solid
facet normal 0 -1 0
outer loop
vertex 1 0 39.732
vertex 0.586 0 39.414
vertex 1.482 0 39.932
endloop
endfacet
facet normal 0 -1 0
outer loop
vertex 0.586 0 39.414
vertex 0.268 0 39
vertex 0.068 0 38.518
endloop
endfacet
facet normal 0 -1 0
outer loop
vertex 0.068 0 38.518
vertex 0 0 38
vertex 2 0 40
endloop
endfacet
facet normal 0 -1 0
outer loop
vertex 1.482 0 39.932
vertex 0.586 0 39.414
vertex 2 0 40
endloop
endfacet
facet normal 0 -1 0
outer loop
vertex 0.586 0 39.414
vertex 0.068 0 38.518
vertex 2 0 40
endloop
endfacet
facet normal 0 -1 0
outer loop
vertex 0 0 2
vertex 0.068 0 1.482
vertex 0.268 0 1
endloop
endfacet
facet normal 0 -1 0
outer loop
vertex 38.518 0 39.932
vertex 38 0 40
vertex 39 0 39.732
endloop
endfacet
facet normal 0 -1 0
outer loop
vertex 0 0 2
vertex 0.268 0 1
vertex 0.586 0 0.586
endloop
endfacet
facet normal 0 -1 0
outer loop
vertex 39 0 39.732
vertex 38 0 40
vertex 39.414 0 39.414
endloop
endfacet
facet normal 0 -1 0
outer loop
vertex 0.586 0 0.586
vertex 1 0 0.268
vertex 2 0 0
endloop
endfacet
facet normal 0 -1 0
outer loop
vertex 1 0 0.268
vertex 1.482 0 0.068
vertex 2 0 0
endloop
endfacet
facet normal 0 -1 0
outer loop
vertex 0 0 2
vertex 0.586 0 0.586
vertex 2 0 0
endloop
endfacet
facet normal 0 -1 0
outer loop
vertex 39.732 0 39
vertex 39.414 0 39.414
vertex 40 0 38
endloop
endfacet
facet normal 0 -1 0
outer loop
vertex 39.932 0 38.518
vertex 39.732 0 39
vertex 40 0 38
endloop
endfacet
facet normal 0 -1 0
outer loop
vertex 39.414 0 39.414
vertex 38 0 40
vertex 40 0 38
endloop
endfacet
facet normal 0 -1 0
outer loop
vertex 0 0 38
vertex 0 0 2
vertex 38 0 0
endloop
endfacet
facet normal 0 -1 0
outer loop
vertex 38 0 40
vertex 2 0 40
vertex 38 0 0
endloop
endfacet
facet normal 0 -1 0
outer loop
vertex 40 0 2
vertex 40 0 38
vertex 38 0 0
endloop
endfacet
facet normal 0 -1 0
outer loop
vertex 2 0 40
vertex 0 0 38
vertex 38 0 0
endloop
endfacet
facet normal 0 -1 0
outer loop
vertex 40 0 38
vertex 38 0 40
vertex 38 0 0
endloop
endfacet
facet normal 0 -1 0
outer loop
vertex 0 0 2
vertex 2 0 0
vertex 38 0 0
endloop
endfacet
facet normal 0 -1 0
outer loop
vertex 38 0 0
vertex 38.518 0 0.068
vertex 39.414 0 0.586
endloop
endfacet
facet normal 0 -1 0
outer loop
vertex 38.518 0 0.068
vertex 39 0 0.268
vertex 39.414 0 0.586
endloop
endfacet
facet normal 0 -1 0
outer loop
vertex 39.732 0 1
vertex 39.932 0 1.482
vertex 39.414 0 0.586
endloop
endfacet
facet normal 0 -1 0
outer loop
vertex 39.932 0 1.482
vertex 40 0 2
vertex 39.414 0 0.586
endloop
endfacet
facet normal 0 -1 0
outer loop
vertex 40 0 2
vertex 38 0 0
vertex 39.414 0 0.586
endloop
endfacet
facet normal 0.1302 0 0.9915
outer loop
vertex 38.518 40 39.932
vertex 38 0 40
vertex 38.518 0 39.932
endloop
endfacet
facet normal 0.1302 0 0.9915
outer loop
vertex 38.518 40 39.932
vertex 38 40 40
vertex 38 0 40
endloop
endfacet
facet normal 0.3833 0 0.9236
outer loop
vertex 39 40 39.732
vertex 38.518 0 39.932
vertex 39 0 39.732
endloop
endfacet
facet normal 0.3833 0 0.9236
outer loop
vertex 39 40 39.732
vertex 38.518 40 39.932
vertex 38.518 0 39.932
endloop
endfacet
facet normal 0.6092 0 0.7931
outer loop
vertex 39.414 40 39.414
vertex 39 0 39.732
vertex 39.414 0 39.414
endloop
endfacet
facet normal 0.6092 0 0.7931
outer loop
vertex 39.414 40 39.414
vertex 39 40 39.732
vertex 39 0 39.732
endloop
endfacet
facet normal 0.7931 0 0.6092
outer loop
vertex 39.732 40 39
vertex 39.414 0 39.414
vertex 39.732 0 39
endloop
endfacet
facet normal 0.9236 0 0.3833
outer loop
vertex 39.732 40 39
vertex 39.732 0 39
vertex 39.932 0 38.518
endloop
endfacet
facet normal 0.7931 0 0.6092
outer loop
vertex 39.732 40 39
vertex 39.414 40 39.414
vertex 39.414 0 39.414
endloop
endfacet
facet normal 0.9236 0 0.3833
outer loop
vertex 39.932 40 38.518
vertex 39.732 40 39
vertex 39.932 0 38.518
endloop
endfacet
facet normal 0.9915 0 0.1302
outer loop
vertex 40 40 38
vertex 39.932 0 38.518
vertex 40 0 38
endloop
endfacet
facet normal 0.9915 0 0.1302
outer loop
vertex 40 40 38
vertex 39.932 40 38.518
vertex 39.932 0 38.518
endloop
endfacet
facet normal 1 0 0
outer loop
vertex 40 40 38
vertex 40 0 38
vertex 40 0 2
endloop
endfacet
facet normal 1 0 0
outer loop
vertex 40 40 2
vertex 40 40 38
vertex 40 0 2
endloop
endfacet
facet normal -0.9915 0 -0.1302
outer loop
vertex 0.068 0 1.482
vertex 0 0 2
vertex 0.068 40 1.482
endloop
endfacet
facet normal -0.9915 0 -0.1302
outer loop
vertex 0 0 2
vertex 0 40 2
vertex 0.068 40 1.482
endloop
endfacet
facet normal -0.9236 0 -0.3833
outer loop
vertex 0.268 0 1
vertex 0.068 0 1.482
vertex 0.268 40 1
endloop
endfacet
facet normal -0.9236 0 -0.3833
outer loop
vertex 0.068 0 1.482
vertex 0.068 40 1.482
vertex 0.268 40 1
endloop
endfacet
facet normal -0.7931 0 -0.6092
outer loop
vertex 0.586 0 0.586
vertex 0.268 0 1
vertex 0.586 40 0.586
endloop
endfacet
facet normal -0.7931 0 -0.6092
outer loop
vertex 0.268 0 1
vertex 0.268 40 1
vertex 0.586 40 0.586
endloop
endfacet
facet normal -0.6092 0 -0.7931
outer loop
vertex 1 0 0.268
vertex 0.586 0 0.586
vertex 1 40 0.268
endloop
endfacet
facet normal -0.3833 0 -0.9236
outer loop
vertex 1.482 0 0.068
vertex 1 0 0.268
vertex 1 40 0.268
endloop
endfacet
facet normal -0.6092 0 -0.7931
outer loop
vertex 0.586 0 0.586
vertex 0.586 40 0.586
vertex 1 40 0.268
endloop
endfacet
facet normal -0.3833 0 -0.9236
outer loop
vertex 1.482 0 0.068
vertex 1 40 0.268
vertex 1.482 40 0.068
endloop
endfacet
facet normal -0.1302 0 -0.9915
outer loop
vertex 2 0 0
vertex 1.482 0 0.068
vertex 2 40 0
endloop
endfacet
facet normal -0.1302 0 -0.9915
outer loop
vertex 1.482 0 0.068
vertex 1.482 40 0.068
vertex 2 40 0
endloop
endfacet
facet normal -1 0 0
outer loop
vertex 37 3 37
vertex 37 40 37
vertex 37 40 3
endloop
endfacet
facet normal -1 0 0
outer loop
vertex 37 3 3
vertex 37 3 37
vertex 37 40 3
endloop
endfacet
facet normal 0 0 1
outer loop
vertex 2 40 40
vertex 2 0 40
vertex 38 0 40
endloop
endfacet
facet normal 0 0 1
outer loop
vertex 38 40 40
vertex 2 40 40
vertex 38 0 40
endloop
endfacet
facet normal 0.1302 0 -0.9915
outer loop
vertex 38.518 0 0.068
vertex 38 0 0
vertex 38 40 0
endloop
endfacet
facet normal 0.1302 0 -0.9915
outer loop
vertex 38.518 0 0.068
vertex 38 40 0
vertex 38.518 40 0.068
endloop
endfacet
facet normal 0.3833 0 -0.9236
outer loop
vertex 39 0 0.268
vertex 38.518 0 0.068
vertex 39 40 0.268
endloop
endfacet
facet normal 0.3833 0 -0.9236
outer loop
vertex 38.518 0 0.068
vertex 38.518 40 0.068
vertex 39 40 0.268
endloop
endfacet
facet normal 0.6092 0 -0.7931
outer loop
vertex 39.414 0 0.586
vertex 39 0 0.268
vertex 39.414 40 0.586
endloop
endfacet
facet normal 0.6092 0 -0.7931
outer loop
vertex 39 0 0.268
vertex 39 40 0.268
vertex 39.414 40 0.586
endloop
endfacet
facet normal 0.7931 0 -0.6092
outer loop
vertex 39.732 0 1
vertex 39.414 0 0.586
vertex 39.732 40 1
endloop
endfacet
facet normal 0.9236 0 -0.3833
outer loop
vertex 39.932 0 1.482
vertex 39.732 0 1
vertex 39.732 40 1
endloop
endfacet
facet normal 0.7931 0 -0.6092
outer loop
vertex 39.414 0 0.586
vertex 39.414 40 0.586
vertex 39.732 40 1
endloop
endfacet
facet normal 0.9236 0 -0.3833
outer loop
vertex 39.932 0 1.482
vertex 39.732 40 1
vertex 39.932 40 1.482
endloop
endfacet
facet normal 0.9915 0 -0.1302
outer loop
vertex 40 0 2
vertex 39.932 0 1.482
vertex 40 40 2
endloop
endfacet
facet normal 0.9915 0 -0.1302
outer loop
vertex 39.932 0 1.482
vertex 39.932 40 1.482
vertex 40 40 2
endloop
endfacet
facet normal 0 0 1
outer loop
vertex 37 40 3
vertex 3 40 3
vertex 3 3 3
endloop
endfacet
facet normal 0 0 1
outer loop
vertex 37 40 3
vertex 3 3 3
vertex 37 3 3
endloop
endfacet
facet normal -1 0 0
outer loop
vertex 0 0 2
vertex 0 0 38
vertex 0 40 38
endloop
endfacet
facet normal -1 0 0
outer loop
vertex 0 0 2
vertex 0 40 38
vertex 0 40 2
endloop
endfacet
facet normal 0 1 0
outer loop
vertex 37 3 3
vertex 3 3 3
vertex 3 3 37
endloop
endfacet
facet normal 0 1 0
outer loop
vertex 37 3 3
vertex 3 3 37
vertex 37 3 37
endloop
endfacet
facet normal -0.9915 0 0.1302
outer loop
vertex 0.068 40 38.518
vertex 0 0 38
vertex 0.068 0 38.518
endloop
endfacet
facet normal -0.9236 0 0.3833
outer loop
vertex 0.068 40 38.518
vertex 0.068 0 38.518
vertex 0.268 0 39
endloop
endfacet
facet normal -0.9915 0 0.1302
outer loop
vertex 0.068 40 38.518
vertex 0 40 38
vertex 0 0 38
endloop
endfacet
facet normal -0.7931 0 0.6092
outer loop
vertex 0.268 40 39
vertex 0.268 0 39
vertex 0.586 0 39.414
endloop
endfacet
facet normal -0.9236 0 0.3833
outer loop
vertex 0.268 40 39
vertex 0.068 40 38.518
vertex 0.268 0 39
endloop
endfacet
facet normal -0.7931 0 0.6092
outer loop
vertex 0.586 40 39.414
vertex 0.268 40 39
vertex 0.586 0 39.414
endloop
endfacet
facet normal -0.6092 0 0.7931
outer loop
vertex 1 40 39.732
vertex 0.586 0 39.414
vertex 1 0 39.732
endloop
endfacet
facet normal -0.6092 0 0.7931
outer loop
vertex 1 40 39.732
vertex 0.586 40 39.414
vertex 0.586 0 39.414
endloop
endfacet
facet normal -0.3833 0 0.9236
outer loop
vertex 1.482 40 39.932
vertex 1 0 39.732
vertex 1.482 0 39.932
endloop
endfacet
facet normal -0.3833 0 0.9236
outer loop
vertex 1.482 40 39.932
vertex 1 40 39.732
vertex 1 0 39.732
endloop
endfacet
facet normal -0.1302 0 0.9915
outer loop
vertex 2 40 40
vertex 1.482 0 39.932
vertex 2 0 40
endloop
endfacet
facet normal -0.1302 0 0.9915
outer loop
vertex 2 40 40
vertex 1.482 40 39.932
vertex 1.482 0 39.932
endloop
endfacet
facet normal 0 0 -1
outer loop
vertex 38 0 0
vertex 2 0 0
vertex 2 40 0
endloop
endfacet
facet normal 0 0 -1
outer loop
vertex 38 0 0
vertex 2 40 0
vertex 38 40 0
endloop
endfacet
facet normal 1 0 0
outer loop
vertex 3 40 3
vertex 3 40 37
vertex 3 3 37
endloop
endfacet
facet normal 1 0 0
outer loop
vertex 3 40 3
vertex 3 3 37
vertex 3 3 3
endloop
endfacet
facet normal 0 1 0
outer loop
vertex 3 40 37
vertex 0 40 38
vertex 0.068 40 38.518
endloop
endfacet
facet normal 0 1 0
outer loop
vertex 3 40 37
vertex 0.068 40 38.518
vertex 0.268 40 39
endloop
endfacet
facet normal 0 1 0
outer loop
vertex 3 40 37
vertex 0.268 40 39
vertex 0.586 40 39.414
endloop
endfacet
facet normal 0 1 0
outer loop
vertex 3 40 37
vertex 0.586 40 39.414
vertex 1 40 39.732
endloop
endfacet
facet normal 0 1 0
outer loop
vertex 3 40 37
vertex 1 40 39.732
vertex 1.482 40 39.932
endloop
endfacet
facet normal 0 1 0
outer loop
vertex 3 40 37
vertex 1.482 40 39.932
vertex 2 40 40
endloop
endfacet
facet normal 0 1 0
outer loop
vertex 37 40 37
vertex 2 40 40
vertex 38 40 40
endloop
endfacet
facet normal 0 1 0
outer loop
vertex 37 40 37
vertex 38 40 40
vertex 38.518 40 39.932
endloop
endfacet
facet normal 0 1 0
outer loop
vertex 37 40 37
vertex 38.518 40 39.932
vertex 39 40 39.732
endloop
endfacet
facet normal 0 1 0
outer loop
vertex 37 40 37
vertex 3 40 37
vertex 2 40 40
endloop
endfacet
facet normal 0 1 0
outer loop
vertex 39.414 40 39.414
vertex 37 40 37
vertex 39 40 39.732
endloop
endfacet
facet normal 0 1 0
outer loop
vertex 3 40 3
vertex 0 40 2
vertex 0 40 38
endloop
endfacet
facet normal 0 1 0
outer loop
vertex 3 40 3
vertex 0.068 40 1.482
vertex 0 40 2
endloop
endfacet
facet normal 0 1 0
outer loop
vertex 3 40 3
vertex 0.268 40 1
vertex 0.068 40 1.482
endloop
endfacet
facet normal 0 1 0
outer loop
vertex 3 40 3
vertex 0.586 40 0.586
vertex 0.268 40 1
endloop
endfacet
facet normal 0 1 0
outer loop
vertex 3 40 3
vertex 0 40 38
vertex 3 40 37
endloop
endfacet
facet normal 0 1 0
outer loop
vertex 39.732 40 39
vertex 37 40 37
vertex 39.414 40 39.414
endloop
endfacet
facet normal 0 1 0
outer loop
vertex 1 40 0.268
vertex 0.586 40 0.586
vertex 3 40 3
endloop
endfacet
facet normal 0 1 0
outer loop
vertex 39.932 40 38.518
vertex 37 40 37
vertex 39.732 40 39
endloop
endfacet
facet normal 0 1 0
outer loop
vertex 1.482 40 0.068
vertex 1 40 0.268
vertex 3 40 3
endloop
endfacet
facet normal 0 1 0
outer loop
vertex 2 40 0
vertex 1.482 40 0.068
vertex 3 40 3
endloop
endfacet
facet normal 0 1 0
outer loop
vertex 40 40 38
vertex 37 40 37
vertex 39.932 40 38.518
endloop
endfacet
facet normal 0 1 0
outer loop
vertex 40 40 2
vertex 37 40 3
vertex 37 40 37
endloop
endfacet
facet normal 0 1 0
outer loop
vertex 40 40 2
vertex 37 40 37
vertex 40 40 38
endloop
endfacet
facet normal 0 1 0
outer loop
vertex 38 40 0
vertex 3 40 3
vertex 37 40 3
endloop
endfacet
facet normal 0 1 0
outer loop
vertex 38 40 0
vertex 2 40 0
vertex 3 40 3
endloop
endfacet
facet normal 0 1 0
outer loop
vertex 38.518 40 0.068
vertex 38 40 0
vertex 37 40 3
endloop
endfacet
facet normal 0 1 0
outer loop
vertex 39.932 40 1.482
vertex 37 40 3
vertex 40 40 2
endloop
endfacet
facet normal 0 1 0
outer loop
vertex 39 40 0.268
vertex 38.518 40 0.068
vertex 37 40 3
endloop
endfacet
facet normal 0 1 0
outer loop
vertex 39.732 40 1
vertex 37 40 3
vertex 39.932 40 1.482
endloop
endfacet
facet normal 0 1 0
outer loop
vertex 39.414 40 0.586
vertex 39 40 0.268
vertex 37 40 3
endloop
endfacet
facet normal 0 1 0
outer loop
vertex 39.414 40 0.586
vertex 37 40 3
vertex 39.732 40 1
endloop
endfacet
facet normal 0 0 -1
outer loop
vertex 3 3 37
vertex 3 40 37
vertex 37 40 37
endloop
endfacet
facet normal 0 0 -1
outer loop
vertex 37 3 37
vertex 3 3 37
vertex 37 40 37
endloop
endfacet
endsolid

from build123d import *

# Parameters (mm, degrees)
SKETCH_1_W          = 40
SKETCH_1_H          = 40
EXTRUDE_1_DEPTH     = 40
SKETCH_2_W          = 34
SKETCH_2_H          = 34
CUT_EXTRUDE_1_DEPTH = 37
FILLET_1_R          = 2


with BuildPart() as part:
    # 草图1 → 凸台-拉伸1 (new body)
    with BuildSketch(Plane(origin=(0, 0, 0), x_dir=(1, 0, 0), z_dir=(0, 1, 0))):
        with Locations((20, -20)):
            Rectangle(SKETCH_1_W, SKETCH_1_H)
    extrude(amount=EXTRUDE_1_DEPTH)

    # 草图2 → 切除-拉伸1 (cut)
    with BuildSketch(Plane(origin=(0, 40, 0), x_dir=(1, 0, 0), z_dir=(0, 1, 0))):
        with Locations((20, -20)):
            Rectangle(SKETCH_2_W, SKETCH_2_H)
    extrude(amount=-CUT_EXTRUDE_1_DEPTH, mode=Mode.SUBTRACT)

    # 圆角1
    fillet_1_edges = [part.edges().sort_by_distance(p)[0] for p in [
        (0, 20, 0),
        (40, 20, 0),
        (40, 20, 40),
        (0, 20, 40),
    ]]
    fillet(fillet_1_edges, radius=FILLET_1_R)


solid = part.part
